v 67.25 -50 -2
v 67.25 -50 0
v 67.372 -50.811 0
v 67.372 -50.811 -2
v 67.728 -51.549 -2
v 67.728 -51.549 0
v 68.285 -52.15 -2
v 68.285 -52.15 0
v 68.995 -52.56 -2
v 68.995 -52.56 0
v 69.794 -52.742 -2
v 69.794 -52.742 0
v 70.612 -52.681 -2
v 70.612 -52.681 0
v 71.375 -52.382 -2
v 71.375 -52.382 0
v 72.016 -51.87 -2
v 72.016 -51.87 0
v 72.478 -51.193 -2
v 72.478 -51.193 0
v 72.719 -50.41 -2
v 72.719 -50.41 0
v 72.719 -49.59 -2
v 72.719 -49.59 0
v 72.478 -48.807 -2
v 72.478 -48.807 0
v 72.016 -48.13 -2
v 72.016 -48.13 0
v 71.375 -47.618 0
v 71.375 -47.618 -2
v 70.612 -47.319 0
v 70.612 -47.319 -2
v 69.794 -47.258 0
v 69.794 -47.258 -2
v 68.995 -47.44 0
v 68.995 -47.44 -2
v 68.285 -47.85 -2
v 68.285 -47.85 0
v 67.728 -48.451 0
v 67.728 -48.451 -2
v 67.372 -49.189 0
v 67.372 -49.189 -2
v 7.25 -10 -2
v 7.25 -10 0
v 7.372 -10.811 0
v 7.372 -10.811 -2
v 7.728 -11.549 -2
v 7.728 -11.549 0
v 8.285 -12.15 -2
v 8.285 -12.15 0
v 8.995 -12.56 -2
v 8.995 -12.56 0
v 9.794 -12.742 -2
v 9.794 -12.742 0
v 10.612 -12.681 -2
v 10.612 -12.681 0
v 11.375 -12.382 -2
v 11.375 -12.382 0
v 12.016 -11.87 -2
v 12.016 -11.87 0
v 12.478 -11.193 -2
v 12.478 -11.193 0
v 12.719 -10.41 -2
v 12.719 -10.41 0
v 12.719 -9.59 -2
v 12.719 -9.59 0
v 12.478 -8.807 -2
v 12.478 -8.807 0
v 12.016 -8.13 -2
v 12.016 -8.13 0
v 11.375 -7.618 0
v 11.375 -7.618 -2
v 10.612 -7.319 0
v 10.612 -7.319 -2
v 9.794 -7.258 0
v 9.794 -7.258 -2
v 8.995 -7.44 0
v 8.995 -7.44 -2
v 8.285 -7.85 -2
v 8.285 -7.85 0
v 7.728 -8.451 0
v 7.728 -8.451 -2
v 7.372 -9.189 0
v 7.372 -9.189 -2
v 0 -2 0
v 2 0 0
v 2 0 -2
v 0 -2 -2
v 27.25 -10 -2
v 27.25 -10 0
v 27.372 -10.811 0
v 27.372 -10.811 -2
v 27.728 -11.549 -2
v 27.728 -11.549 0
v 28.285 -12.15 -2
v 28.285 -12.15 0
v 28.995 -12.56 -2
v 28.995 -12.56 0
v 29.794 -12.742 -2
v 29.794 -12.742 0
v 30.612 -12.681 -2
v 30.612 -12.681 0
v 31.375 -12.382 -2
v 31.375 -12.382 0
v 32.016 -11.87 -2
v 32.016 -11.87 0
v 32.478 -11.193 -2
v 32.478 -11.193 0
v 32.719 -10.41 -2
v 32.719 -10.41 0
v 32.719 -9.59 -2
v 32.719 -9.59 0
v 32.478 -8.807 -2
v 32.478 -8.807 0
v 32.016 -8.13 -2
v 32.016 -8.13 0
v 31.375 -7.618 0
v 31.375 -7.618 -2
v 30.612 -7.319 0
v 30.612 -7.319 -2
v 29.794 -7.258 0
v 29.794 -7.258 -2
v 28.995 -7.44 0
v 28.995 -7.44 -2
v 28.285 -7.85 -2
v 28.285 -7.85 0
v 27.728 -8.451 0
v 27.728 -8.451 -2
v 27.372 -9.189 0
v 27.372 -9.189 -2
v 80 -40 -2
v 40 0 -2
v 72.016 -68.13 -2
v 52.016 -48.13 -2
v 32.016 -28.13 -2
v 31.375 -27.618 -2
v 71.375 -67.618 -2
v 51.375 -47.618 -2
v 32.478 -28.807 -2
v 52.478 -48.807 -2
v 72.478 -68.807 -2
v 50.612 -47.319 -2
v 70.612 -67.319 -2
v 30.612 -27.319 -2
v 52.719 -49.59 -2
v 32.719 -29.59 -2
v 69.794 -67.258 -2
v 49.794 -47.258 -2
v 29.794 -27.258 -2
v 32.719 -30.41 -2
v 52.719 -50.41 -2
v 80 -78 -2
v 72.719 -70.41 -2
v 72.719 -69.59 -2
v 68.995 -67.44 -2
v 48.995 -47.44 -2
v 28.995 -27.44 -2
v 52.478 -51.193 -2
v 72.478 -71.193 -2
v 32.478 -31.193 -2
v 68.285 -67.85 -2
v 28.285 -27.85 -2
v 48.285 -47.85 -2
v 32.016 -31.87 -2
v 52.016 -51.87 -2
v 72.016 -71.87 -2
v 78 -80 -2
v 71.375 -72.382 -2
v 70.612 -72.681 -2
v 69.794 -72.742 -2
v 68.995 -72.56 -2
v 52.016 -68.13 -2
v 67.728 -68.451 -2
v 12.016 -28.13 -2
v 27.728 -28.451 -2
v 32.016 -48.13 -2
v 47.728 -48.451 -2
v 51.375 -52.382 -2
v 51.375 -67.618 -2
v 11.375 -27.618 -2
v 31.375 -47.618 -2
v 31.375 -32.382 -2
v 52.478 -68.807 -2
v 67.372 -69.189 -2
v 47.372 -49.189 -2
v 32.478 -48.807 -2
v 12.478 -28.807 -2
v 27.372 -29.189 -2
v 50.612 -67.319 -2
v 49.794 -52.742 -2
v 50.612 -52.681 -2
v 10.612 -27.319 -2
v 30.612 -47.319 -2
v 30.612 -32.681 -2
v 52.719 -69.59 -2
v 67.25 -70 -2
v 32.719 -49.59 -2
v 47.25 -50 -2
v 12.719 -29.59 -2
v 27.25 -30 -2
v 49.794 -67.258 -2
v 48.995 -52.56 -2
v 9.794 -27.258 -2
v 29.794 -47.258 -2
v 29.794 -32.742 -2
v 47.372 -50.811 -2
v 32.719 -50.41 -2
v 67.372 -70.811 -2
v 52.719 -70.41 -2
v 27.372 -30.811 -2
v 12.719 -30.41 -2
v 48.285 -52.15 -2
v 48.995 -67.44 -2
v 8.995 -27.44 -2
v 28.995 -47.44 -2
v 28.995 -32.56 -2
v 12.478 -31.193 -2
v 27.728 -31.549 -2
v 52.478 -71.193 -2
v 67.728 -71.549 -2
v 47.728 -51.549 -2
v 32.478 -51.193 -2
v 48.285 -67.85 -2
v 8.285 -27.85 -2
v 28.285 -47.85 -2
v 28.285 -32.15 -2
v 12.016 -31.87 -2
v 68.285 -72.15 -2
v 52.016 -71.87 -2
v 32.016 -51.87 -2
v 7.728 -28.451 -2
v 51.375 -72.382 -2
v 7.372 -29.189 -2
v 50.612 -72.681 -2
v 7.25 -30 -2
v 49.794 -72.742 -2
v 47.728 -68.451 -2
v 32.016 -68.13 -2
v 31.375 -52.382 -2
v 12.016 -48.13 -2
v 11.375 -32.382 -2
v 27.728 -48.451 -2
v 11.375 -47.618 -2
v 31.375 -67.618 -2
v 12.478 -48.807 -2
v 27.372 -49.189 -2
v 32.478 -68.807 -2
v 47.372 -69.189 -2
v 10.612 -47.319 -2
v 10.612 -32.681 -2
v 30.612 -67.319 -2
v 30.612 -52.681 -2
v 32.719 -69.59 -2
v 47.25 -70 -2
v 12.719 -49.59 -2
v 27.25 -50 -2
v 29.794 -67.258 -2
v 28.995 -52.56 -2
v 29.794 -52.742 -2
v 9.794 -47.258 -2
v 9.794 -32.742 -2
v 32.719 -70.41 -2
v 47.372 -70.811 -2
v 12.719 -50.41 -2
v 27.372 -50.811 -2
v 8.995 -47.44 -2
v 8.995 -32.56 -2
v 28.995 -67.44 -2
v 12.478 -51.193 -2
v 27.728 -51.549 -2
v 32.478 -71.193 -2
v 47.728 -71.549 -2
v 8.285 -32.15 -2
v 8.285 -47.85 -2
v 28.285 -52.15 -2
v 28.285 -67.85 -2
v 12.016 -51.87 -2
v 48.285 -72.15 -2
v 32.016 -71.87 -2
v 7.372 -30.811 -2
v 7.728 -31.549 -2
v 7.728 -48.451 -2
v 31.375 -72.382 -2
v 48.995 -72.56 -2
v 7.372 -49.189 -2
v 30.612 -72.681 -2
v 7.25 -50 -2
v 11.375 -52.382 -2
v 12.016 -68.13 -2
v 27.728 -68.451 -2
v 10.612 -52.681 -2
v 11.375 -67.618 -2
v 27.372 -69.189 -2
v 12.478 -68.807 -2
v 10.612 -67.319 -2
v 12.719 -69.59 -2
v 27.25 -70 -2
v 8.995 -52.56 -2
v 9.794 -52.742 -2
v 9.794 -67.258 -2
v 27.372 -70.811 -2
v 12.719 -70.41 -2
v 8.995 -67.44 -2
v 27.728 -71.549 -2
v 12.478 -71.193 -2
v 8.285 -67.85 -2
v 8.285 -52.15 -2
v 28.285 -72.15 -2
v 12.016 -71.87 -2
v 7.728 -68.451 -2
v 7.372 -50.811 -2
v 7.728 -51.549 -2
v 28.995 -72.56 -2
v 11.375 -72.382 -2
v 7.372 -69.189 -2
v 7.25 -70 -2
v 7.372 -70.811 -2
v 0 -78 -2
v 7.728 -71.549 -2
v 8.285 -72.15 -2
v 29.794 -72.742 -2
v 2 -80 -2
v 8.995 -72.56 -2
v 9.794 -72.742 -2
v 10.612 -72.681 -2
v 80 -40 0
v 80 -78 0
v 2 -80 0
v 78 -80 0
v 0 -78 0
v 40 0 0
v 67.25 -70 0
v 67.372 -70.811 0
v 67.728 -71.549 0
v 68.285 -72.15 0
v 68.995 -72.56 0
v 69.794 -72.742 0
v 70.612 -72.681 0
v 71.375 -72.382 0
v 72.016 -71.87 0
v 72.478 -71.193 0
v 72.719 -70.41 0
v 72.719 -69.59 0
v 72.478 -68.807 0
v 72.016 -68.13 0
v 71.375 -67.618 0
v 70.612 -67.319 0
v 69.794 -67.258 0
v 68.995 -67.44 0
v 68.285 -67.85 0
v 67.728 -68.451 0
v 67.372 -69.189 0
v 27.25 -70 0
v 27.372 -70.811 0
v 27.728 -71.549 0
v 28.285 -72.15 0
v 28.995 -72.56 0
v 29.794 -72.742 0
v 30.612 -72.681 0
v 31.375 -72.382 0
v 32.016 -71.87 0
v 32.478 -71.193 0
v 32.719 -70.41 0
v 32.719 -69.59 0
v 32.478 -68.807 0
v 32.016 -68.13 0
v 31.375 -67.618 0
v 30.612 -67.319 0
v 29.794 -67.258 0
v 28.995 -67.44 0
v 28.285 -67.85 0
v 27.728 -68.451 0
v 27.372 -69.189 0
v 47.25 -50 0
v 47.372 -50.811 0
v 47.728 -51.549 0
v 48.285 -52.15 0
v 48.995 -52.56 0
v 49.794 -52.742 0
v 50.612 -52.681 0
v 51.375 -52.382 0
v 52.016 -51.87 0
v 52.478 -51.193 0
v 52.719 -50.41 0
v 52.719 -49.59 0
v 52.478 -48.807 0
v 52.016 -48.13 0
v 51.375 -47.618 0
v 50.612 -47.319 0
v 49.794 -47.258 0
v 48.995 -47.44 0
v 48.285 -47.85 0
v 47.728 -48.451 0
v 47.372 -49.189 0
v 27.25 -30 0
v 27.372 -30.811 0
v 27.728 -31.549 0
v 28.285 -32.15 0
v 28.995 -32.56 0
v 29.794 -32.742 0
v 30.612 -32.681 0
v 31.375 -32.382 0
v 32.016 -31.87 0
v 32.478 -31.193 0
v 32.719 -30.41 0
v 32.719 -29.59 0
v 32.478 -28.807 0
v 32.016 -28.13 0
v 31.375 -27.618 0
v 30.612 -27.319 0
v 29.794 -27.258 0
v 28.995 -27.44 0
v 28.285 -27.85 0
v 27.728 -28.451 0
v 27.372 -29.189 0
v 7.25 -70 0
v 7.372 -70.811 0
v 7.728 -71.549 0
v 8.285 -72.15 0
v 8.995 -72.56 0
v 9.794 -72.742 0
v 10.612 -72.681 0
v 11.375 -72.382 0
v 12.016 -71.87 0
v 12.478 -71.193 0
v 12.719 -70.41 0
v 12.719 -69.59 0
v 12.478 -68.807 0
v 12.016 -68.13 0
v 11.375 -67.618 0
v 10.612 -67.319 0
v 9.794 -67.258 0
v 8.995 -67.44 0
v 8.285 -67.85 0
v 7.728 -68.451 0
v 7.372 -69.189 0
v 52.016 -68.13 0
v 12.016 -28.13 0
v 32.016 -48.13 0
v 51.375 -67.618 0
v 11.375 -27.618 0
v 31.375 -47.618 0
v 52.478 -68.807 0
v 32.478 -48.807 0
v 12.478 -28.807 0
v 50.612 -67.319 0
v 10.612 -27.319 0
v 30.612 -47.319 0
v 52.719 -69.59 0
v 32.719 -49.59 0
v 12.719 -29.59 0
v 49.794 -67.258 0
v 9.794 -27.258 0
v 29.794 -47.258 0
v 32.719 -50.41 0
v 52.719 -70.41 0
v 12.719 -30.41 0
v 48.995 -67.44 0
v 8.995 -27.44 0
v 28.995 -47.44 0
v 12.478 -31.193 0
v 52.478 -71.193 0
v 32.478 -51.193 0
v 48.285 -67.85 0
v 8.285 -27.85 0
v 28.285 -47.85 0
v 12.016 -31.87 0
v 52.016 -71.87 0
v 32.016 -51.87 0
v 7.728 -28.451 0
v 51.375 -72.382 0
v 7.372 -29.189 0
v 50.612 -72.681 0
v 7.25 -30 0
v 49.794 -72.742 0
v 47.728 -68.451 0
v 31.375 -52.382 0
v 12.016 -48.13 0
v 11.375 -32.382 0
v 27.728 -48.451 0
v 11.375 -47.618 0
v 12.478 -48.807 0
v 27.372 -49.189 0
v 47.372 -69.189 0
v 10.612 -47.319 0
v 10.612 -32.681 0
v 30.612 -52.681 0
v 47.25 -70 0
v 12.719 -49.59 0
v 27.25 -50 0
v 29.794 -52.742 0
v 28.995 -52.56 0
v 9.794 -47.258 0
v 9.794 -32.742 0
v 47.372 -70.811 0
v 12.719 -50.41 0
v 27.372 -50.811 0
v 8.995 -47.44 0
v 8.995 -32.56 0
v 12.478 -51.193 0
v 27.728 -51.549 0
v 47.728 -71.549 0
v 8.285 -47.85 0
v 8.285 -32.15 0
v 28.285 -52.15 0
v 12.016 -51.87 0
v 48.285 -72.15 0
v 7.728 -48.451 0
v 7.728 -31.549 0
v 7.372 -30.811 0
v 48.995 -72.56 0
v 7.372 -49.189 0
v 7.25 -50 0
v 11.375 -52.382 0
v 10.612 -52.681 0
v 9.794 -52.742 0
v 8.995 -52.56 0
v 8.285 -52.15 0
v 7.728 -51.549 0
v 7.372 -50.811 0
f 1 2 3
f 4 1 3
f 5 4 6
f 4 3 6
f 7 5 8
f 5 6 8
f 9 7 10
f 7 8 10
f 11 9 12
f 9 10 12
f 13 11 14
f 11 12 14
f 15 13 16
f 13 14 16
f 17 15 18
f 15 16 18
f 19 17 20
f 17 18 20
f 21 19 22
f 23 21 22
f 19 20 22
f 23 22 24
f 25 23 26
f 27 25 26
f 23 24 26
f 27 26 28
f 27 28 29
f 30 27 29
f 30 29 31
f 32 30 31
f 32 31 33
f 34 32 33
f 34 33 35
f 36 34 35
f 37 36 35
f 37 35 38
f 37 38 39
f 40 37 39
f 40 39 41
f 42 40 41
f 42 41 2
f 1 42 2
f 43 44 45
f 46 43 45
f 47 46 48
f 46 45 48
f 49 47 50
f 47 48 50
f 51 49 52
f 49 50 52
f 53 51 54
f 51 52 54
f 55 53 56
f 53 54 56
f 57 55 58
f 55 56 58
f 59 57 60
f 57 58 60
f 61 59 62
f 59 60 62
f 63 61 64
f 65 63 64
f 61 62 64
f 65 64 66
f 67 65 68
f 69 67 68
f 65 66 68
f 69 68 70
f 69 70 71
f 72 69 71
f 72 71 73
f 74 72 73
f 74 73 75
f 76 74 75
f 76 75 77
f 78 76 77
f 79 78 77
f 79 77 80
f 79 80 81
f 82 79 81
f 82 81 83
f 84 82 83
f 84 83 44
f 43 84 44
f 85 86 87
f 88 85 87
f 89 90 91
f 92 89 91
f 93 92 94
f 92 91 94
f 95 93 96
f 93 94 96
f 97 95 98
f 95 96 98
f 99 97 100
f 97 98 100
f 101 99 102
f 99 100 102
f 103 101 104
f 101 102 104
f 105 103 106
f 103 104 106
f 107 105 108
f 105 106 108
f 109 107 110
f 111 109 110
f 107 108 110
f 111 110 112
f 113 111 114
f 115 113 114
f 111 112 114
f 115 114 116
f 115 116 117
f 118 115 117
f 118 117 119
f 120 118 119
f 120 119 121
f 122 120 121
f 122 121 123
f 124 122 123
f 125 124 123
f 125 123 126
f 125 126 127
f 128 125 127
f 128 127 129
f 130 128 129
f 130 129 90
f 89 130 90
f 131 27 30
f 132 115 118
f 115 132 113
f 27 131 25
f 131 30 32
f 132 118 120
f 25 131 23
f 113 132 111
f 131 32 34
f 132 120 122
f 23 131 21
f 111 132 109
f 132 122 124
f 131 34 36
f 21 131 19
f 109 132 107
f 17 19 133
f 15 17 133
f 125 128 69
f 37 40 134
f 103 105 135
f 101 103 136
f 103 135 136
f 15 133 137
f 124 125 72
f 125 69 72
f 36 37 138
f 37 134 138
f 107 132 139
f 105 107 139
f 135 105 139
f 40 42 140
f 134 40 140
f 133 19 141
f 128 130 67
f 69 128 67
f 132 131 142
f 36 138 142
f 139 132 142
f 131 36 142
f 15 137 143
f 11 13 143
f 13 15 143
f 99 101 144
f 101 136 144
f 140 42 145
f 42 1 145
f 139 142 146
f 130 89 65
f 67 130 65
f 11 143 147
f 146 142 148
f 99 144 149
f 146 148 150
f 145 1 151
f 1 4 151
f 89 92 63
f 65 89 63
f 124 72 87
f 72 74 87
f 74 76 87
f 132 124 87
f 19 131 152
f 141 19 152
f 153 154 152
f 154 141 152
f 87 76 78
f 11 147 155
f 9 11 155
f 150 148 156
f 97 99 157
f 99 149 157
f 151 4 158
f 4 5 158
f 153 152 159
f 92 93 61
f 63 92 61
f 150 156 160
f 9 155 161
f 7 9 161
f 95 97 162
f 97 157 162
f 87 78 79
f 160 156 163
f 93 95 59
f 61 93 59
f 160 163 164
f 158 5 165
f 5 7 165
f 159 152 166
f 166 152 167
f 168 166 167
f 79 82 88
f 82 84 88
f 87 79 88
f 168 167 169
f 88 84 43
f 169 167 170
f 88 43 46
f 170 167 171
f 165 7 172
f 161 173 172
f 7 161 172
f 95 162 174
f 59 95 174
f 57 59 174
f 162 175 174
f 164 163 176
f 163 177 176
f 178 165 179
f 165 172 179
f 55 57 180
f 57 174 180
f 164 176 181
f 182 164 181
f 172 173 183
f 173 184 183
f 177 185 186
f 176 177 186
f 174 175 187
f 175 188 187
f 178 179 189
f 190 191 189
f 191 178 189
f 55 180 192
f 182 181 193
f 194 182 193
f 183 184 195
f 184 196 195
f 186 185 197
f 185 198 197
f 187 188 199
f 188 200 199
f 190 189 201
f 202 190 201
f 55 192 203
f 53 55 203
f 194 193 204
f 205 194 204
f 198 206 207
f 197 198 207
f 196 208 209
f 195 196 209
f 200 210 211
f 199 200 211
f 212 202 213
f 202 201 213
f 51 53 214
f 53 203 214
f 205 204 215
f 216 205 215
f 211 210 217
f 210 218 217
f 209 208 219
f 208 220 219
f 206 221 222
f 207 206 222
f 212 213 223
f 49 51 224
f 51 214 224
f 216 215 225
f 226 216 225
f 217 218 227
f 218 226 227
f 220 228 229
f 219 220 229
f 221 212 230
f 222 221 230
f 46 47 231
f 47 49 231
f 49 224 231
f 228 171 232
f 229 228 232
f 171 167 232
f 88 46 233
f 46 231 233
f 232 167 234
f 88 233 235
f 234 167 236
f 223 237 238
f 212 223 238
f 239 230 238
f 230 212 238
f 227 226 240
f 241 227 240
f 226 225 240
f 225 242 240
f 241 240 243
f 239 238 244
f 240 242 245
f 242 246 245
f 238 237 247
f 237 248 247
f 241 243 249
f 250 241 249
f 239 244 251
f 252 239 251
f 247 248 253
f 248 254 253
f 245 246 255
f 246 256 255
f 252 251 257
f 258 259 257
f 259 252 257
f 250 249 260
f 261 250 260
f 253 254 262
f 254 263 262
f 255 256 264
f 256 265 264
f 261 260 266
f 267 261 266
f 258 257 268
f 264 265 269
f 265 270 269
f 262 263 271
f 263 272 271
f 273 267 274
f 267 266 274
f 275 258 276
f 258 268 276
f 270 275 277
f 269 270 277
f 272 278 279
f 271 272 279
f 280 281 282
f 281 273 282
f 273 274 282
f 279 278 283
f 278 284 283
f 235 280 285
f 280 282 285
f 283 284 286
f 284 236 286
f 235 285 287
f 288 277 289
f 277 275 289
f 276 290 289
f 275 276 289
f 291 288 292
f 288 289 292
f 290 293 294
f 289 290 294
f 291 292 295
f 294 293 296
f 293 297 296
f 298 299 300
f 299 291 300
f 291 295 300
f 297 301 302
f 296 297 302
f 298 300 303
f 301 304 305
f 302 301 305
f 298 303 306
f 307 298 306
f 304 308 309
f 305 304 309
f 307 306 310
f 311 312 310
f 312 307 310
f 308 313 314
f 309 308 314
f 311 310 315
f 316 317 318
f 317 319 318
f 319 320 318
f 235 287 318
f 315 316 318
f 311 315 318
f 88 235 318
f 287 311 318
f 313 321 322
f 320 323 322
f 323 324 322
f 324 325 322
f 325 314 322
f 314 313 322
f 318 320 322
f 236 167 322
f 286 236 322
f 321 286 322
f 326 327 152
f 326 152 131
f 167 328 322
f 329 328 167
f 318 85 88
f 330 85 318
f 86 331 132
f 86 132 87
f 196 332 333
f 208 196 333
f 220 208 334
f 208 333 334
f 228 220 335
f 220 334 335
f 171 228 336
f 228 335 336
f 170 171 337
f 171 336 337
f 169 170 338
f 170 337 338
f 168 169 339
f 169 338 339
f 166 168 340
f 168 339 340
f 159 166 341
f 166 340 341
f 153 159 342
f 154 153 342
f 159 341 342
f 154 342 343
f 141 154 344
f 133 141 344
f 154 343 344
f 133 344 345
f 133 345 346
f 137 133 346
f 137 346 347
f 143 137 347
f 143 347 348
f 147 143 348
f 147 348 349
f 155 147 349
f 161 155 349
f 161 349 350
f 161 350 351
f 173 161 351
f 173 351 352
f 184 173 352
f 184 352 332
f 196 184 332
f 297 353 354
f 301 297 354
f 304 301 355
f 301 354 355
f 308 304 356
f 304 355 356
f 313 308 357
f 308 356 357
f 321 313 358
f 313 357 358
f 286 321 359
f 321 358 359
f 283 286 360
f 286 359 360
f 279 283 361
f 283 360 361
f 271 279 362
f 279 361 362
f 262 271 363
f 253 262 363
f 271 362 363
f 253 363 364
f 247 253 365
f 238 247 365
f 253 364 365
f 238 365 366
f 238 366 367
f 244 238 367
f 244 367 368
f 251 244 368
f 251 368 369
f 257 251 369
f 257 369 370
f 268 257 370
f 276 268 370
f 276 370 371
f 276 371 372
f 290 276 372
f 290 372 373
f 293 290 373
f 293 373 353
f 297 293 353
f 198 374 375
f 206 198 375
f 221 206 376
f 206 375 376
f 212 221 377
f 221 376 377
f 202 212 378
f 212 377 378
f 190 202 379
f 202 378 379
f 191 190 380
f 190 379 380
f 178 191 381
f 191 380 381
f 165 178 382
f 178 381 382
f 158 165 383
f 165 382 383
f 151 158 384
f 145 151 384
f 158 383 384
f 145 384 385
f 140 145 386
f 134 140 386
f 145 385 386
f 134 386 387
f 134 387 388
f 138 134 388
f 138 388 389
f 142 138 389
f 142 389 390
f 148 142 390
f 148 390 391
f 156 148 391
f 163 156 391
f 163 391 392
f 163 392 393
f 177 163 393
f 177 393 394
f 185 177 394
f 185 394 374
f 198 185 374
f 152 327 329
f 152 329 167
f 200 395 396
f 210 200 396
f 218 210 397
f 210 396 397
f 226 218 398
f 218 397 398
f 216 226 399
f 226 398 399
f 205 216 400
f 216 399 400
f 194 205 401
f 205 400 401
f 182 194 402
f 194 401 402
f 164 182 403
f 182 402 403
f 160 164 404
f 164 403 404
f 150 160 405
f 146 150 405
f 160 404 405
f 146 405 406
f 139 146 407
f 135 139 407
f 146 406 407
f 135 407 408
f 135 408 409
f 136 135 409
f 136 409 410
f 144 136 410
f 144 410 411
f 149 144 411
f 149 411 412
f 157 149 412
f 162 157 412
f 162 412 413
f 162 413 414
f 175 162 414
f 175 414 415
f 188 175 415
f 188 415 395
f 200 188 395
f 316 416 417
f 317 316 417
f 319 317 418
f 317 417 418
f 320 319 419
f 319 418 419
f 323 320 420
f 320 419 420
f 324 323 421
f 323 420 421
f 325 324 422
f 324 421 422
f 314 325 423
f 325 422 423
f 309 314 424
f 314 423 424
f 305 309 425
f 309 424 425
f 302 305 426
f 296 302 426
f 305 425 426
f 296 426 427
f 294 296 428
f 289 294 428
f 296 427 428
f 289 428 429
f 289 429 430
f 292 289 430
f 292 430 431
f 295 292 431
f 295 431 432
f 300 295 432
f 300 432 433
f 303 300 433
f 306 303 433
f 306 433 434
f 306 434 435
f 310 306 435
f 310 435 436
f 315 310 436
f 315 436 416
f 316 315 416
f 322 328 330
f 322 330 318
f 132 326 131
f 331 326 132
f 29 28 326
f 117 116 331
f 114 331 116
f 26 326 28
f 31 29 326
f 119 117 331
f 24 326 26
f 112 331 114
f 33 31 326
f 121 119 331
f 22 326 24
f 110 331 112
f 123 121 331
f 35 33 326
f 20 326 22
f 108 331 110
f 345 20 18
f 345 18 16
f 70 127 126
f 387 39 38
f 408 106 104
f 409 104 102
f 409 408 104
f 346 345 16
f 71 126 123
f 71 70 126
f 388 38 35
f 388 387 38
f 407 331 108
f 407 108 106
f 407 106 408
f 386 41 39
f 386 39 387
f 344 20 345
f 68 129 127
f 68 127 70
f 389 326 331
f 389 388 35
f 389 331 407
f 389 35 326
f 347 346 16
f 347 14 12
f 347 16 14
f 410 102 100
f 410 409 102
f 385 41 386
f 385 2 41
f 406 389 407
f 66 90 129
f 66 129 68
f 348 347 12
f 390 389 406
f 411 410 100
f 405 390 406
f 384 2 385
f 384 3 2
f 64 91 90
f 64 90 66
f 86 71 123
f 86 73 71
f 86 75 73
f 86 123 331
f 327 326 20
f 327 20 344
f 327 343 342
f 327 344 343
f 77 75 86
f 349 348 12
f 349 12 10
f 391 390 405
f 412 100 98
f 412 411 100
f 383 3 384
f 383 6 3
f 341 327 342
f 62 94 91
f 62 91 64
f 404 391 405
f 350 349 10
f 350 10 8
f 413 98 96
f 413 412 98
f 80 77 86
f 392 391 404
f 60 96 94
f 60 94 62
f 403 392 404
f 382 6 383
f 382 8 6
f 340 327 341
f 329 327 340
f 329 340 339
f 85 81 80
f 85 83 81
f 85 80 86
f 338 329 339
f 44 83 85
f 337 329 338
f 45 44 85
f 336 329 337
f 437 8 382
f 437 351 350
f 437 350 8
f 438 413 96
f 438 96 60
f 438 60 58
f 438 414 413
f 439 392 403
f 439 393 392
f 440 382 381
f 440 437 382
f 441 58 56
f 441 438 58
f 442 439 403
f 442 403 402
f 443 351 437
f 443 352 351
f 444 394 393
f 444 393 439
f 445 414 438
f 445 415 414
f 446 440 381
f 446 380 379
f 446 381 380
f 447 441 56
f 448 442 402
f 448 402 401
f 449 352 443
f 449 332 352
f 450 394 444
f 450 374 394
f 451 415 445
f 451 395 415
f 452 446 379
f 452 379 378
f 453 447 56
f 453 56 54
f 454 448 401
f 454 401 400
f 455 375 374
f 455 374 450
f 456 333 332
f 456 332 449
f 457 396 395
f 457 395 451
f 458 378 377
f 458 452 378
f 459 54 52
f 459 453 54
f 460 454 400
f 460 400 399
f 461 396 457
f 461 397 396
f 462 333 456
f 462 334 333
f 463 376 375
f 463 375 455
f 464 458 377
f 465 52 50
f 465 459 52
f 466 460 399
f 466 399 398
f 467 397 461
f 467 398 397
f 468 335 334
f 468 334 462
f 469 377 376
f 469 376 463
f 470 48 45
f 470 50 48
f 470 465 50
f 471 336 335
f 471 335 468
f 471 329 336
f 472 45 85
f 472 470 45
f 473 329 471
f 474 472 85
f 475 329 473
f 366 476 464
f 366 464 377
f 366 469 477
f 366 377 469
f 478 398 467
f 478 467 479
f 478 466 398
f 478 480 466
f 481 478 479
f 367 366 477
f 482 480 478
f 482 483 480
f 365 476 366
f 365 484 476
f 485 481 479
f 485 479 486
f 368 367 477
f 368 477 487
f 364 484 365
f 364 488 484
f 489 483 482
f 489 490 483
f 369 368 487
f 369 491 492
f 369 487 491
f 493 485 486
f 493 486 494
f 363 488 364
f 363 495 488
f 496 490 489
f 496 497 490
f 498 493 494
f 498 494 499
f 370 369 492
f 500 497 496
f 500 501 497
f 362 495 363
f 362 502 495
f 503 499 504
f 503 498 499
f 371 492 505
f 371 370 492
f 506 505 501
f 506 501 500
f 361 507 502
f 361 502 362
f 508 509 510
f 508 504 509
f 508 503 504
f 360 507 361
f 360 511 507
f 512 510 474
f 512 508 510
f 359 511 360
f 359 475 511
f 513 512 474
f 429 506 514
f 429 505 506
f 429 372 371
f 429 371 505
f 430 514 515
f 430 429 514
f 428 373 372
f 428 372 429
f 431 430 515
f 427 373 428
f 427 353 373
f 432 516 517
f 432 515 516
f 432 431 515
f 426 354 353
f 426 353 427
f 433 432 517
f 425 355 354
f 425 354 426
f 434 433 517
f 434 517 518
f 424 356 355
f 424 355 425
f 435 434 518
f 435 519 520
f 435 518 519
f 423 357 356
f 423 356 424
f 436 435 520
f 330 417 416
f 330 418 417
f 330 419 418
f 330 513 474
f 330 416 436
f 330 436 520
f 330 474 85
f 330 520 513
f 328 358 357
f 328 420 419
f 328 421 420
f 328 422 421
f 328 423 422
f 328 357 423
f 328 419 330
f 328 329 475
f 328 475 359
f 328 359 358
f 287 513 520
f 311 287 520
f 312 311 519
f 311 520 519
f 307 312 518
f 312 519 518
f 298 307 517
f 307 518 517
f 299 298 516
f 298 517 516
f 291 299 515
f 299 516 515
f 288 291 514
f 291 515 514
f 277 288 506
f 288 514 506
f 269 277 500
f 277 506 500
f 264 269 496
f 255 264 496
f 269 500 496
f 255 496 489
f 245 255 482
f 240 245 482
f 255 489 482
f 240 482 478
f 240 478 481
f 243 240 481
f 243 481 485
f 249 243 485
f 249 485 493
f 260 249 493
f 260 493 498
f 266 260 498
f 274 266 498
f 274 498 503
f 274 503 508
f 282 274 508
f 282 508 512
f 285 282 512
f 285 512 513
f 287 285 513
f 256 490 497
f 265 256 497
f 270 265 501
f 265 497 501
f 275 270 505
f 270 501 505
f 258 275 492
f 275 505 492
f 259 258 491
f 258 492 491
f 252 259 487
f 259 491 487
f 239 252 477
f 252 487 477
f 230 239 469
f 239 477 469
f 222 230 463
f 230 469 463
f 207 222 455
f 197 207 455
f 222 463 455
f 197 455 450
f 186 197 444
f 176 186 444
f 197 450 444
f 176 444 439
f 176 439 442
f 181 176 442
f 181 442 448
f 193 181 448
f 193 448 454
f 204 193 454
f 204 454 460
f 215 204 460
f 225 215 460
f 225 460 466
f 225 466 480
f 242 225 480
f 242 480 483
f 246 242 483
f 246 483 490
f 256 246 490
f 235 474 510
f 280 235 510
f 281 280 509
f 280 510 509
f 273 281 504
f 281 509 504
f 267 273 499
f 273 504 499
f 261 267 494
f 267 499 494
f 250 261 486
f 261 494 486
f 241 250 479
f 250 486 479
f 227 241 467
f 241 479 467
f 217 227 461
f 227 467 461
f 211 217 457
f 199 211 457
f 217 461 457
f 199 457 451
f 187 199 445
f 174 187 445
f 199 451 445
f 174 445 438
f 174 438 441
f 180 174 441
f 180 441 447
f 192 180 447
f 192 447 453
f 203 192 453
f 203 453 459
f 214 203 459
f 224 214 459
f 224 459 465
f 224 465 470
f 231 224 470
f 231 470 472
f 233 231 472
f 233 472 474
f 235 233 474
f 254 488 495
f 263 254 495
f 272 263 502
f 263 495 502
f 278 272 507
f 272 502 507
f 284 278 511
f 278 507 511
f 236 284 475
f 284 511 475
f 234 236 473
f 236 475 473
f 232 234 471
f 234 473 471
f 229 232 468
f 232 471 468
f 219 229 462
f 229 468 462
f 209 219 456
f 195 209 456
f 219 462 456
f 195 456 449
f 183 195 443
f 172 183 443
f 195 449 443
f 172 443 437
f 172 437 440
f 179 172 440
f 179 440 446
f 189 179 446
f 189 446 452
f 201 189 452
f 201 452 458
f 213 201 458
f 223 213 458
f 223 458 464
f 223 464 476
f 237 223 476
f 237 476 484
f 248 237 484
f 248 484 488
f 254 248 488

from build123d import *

# Parameters (mm, degrees)
EXTRUDE_1_DEPTH   = 2
HOLE_WIZARD_M51_D = 5.5
CHAMFER_1_SIZE    = 2


with BuildPart() as part:
    # Эскиз1 → Бобышка-Вытянуть1 (new body)
    with BuildSketch(Plane(origin=(0, 0, 0), x_dir=(1, 0, 0), z_dir=(0, 0, -1))):
        Polygon((0, 0), (0, 80), (80, 80), (80, 40), (40, 0), align=None)
    extrude(amount=EXTRUDE_1_DEPTH)

    # Отверстие с зазором M51 (through all)
    with Locations(Plane(origin=(0, 0, -2), x_dir=(1, 0, 0), z_dir=(0, 0, -1))):
        with Locations((10, 70), (10, 50), (10, 30), (10, 10), (30, 70), (30, 50), (30, 30), (30, 10), (50, 70), (50, 50), (70, 70), (70, 50)):
            Hole(HOLE_WIZARD_M51_D / 2)

    # Фаска1
    chamfer_1_edges = [part.edges().sort_by_distance(p)[0] for p in [
        (0, 0, -1),
        (0, -80, -1),
        (80, -80, -1),
    ]]
    chamfer(chamfer_1_edges, length=CHAMFER_1_SIZE)


solid = part.part
